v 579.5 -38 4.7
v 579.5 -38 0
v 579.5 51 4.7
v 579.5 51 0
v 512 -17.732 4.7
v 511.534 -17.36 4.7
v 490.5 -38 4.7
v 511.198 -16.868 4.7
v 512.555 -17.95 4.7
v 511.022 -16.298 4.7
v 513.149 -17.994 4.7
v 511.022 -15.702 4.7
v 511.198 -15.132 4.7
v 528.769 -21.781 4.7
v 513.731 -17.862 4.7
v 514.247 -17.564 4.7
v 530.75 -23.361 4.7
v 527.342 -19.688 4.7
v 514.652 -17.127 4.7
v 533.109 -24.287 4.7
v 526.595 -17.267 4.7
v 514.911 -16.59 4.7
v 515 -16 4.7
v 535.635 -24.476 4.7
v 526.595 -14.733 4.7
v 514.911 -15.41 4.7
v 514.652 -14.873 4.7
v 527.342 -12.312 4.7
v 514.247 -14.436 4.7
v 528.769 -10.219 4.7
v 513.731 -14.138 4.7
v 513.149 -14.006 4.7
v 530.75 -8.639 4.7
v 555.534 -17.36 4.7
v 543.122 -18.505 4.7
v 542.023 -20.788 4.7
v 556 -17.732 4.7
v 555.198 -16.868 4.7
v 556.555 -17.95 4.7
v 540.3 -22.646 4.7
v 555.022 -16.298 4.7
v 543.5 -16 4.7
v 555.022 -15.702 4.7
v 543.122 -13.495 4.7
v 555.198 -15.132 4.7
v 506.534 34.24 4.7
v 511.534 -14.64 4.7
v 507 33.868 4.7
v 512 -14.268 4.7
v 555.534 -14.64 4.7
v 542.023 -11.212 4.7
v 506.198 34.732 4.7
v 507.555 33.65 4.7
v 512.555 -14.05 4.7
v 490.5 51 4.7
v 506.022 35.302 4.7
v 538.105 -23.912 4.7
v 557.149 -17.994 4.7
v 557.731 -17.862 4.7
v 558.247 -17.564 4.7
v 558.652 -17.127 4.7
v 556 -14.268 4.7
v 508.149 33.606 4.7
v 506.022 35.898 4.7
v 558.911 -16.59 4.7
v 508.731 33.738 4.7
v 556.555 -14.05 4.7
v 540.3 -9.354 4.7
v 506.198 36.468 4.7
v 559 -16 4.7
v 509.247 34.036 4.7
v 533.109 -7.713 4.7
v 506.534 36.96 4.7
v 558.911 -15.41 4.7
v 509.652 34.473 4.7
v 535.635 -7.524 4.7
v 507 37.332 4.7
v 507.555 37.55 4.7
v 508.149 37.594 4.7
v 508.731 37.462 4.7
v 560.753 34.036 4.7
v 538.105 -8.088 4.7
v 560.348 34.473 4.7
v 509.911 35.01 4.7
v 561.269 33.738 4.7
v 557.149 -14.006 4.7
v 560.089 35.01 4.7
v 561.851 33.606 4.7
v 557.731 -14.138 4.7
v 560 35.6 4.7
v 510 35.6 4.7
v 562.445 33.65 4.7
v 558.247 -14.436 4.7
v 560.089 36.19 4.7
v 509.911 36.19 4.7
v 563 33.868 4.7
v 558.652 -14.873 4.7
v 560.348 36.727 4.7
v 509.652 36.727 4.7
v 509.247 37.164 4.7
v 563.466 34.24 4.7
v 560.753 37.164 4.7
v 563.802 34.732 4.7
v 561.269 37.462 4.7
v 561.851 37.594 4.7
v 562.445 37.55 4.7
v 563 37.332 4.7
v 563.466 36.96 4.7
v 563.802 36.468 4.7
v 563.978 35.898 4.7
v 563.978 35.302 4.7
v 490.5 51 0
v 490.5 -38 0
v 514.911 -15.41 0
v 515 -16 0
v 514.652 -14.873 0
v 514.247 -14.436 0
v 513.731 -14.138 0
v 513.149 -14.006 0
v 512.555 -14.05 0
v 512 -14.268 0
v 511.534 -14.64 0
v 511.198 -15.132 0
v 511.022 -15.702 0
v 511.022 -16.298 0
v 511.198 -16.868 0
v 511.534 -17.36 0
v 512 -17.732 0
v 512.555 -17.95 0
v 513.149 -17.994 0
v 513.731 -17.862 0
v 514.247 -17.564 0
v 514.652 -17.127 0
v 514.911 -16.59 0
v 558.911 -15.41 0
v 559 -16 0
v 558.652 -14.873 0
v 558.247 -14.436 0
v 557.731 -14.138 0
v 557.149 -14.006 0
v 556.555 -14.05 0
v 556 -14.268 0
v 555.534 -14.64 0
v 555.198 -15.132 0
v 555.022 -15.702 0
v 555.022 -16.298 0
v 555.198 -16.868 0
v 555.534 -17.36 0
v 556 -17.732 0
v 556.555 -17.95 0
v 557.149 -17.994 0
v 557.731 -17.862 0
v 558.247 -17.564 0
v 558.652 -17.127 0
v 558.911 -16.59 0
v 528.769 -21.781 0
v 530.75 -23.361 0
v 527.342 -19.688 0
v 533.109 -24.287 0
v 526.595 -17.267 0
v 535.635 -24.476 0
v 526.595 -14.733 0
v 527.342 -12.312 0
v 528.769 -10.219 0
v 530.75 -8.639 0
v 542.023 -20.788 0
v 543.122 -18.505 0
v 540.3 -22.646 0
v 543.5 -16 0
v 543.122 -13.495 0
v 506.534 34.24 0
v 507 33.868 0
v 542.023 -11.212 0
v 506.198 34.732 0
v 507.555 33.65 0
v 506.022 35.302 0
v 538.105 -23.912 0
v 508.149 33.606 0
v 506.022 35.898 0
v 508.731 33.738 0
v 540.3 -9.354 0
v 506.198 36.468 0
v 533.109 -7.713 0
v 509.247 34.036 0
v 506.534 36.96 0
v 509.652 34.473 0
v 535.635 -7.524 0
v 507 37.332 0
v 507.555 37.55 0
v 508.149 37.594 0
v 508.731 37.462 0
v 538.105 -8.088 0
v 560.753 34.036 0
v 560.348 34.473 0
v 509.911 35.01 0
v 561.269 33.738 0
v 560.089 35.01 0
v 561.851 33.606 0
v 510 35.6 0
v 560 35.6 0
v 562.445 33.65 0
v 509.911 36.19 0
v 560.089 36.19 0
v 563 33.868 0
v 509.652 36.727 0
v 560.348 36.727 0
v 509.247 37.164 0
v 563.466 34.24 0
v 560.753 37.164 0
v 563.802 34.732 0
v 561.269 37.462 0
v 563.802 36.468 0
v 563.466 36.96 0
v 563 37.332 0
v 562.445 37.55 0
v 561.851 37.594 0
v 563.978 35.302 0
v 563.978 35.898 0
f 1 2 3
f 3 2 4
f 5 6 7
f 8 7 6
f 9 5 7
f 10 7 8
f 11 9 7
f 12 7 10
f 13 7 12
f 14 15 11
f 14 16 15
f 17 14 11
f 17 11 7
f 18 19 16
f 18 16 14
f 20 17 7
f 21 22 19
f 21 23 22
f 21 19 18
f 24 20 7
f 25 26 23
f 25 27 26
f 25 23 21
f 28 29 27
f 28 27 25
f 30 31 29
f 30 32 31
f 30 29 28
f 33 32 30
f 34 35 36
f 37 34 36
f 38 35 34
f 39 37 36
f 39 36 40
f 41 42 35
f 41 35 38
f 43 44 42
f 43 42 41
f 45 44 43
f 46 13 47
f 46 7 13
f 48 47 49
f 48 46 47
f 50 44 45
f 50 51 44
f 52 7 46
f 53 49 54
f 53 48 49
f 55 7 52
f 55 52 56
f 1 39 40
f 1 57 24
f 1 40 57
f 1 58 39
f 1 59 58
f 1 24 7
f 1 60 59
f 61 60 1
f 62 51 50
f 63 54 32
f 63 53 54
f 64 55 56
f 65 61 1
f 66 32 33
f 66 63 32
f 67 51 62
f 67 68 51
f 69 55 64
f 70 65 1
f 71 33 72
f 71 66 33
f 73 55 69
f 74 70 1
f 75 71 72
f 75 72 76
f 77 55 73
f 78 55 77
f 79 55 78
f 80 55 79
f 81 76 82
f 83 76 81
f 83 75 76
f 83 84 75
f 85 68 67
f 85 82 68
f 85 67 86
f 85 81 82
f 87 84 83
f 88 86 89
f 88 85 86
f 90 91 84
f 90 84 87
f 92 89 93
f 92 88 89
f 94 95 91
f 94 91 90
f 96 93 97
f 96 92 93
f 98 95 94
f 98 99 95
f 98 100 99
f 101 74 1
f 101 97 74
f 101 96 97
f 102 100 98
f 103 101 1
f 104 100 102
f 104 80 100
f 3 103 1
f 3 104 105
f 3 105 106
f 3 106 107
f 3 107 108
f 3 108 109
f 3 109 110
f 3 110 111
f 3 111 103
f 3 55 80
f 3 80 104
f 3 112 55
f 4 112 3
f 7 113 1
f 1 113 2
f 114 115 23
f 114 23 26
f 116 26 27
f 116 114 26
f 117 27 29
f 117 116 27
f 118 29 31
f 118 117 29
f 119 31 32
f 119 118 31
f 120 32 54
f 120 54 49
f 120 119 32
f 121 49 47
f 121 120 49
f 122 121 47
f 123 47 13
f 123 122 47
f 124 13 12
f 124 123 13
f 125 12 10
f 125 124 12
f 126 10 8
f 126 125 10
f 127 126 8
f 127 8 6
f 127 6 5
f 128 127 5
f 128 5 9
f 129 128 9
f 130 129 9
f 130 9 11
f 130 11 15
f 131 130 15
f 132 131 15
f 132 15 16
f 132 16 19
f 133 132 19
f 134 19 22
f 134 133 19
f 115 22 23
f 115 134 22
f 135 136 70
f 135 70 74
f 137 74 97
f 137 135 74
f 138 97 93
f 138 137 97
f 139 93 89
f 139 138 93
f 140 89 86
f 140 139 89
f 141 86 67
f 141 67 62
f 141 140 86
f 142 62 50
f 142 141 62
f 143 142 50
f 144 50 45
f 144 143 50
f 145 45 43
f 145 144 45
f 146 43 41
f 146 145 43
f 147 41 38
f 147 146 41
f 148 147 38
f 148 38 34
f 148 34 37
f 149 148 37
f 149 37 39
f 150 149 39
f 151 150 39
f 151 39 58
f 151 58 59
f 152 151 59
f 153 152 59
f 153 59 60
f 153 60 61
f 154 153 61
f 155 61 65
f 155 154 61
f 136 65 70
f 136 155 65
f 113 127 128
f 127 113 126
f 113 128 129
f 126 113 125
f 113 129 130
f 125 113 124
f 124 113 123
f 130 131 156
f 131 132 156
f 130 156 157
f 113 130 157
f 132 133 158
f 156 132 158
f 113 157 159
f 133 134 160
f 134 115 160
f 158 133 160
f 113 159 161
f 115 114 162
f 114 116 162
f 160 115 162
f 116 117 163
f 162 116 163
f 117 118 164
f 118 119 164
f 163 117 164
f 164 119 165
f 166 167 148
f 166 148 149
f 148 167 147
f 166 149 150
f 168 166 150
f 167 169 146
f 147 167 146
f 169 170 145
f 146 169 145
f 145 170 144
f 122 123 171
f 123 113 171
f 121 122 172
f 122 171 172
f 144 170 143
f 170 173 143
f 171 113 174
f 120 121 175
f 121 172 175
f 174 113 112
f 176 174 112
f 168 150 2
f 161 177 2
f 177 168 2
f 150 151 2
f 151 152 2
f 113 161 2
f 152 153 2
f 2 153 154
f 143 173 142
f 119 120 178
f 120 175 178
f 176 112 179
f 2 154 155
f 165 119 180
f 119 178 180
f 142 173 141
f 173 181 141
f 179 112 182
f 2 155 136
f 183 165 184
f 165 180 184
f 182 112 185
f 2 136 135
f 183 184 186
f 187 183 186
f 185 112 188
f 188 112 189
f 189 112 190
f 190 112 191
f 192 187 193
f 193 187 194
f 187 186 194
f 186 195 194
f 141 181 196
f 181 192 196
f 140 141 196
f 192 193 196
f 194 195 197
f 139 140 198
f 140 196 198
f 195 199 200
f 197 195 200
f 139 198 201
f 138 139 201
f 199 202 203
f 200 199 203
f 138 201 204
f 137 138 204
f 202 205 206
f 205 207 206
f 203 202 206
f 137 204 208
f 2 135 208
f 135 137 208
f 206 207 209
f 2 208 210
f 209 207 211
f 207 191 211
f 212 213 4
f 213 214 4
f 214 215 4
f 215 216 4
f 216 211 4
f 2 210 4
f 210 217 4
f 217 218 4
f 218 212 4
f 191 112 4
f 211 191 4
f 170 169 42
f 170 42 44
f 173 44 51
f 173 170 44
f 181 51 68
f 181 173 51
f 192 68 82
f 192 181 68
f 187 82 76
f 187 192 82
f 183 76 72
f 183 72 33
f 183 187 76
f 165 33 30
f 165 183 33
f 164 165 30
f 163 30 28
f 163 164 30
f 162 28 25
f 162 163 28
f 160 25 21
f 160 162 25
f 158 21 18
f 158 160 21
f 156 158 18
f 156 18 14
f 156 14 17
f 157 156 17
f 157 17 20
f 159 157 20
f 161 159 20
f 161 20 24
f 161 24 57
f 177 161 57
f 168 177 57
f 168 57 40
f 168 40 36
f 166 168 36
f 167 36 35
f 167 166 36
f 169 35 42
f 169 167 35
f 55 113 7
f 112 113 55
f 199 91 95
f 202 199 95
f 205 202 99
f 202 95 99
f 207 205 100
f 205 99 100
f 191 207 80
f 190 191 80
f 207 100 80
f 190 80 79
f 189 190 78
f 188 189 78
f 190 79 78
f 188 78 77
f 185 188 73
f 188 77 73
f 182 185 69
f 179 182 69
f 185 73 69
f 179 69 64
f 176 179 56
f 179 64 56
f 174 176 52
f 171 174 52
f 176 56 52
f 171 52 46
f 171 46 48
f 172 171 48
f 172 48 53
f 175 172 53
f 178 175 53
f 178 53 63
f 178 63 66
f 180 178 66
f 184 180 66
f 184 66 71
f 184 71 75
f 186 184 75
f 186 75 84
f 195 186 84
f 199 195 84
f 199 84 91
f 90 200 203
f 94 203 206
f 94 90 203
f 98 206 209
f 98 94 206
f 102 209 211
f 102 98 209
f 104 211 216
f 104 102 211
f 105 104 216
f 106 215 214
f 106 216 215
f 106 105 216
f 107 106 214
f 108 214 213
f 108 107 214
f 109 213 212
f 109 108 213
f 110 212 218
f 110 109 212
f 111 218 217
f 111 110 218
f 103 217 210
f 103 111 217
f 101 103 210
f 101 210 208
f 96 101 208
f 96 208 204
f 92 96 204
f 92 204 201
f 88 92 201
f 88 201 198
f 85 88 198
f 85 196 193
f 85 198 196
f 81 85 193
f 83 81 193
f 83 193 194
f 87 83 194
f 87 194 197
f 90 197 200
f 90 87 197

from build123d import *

# Parameters (mm, degrees)
SKETCH016_W     = 89
SKETCH016_H     = 89
SKETCH016_R     = 8.5
SKETCH016_R_2   = 2
PAD012_DEPTH    = 4.7
SKETCH021_R     = 2
POCKET003_DEPTH = 256.606458


with BuildPart() as part:
    # Sketch016 → Pad012 (new body)
    with BuildSketch(Plane.XY):
        Rectangle(SKETCH016_W, SKETCH016_H)
        with Locations((0, -22.5)):
            Circle(SKETCH016_R, mode=Mode.SUBTRACT)
        with Locations((-22, -22.5)):
            Circle(SKETCH016_R_2, mode=Mode.SUBTRACT)
        with Locations((22, -22.5)):
            Circle(SKETCH016_R_2, mode=Mode.SUBTRACT)
    extrude(amount=PAD012_DEPTH)

    # Sketch021 (on Face9 of Pad012) → Pocket003 (cut, through all)
    with BuildSketch(Plane.XY.offset(4.7)):
        with Locations((-27, 29.1)):
            Circle(SKETCH021_R)
    pocket003 = extrude(amount=-POCKET003_DEPTH, mode=Mode.SUBTRACT)

    # Mirrored002: Pocket003 across Sketch021 V_Axis
    add(pocket003.mirror(Plane(origin=(0, 0, 4.7), x_dir=(0, 0, 1), z_dir=(1, 0, 0))), mode=Mode.SUBTRACT)


with BuildPart() as part_1:
    # Body013 placement: moved
    add(part.part.moved(Location((0, 0, 99))))


with BuildPart() as part_2:
    # Clone006 placement: moved
    add(part_1.part.moved(Location((0, 0, -99))))


with BuildPart() as part_3:
    # Body019 placement: moved
    add(part_2.part.moved(Location((535, 6.5, 0))))


solid = part_3.part
